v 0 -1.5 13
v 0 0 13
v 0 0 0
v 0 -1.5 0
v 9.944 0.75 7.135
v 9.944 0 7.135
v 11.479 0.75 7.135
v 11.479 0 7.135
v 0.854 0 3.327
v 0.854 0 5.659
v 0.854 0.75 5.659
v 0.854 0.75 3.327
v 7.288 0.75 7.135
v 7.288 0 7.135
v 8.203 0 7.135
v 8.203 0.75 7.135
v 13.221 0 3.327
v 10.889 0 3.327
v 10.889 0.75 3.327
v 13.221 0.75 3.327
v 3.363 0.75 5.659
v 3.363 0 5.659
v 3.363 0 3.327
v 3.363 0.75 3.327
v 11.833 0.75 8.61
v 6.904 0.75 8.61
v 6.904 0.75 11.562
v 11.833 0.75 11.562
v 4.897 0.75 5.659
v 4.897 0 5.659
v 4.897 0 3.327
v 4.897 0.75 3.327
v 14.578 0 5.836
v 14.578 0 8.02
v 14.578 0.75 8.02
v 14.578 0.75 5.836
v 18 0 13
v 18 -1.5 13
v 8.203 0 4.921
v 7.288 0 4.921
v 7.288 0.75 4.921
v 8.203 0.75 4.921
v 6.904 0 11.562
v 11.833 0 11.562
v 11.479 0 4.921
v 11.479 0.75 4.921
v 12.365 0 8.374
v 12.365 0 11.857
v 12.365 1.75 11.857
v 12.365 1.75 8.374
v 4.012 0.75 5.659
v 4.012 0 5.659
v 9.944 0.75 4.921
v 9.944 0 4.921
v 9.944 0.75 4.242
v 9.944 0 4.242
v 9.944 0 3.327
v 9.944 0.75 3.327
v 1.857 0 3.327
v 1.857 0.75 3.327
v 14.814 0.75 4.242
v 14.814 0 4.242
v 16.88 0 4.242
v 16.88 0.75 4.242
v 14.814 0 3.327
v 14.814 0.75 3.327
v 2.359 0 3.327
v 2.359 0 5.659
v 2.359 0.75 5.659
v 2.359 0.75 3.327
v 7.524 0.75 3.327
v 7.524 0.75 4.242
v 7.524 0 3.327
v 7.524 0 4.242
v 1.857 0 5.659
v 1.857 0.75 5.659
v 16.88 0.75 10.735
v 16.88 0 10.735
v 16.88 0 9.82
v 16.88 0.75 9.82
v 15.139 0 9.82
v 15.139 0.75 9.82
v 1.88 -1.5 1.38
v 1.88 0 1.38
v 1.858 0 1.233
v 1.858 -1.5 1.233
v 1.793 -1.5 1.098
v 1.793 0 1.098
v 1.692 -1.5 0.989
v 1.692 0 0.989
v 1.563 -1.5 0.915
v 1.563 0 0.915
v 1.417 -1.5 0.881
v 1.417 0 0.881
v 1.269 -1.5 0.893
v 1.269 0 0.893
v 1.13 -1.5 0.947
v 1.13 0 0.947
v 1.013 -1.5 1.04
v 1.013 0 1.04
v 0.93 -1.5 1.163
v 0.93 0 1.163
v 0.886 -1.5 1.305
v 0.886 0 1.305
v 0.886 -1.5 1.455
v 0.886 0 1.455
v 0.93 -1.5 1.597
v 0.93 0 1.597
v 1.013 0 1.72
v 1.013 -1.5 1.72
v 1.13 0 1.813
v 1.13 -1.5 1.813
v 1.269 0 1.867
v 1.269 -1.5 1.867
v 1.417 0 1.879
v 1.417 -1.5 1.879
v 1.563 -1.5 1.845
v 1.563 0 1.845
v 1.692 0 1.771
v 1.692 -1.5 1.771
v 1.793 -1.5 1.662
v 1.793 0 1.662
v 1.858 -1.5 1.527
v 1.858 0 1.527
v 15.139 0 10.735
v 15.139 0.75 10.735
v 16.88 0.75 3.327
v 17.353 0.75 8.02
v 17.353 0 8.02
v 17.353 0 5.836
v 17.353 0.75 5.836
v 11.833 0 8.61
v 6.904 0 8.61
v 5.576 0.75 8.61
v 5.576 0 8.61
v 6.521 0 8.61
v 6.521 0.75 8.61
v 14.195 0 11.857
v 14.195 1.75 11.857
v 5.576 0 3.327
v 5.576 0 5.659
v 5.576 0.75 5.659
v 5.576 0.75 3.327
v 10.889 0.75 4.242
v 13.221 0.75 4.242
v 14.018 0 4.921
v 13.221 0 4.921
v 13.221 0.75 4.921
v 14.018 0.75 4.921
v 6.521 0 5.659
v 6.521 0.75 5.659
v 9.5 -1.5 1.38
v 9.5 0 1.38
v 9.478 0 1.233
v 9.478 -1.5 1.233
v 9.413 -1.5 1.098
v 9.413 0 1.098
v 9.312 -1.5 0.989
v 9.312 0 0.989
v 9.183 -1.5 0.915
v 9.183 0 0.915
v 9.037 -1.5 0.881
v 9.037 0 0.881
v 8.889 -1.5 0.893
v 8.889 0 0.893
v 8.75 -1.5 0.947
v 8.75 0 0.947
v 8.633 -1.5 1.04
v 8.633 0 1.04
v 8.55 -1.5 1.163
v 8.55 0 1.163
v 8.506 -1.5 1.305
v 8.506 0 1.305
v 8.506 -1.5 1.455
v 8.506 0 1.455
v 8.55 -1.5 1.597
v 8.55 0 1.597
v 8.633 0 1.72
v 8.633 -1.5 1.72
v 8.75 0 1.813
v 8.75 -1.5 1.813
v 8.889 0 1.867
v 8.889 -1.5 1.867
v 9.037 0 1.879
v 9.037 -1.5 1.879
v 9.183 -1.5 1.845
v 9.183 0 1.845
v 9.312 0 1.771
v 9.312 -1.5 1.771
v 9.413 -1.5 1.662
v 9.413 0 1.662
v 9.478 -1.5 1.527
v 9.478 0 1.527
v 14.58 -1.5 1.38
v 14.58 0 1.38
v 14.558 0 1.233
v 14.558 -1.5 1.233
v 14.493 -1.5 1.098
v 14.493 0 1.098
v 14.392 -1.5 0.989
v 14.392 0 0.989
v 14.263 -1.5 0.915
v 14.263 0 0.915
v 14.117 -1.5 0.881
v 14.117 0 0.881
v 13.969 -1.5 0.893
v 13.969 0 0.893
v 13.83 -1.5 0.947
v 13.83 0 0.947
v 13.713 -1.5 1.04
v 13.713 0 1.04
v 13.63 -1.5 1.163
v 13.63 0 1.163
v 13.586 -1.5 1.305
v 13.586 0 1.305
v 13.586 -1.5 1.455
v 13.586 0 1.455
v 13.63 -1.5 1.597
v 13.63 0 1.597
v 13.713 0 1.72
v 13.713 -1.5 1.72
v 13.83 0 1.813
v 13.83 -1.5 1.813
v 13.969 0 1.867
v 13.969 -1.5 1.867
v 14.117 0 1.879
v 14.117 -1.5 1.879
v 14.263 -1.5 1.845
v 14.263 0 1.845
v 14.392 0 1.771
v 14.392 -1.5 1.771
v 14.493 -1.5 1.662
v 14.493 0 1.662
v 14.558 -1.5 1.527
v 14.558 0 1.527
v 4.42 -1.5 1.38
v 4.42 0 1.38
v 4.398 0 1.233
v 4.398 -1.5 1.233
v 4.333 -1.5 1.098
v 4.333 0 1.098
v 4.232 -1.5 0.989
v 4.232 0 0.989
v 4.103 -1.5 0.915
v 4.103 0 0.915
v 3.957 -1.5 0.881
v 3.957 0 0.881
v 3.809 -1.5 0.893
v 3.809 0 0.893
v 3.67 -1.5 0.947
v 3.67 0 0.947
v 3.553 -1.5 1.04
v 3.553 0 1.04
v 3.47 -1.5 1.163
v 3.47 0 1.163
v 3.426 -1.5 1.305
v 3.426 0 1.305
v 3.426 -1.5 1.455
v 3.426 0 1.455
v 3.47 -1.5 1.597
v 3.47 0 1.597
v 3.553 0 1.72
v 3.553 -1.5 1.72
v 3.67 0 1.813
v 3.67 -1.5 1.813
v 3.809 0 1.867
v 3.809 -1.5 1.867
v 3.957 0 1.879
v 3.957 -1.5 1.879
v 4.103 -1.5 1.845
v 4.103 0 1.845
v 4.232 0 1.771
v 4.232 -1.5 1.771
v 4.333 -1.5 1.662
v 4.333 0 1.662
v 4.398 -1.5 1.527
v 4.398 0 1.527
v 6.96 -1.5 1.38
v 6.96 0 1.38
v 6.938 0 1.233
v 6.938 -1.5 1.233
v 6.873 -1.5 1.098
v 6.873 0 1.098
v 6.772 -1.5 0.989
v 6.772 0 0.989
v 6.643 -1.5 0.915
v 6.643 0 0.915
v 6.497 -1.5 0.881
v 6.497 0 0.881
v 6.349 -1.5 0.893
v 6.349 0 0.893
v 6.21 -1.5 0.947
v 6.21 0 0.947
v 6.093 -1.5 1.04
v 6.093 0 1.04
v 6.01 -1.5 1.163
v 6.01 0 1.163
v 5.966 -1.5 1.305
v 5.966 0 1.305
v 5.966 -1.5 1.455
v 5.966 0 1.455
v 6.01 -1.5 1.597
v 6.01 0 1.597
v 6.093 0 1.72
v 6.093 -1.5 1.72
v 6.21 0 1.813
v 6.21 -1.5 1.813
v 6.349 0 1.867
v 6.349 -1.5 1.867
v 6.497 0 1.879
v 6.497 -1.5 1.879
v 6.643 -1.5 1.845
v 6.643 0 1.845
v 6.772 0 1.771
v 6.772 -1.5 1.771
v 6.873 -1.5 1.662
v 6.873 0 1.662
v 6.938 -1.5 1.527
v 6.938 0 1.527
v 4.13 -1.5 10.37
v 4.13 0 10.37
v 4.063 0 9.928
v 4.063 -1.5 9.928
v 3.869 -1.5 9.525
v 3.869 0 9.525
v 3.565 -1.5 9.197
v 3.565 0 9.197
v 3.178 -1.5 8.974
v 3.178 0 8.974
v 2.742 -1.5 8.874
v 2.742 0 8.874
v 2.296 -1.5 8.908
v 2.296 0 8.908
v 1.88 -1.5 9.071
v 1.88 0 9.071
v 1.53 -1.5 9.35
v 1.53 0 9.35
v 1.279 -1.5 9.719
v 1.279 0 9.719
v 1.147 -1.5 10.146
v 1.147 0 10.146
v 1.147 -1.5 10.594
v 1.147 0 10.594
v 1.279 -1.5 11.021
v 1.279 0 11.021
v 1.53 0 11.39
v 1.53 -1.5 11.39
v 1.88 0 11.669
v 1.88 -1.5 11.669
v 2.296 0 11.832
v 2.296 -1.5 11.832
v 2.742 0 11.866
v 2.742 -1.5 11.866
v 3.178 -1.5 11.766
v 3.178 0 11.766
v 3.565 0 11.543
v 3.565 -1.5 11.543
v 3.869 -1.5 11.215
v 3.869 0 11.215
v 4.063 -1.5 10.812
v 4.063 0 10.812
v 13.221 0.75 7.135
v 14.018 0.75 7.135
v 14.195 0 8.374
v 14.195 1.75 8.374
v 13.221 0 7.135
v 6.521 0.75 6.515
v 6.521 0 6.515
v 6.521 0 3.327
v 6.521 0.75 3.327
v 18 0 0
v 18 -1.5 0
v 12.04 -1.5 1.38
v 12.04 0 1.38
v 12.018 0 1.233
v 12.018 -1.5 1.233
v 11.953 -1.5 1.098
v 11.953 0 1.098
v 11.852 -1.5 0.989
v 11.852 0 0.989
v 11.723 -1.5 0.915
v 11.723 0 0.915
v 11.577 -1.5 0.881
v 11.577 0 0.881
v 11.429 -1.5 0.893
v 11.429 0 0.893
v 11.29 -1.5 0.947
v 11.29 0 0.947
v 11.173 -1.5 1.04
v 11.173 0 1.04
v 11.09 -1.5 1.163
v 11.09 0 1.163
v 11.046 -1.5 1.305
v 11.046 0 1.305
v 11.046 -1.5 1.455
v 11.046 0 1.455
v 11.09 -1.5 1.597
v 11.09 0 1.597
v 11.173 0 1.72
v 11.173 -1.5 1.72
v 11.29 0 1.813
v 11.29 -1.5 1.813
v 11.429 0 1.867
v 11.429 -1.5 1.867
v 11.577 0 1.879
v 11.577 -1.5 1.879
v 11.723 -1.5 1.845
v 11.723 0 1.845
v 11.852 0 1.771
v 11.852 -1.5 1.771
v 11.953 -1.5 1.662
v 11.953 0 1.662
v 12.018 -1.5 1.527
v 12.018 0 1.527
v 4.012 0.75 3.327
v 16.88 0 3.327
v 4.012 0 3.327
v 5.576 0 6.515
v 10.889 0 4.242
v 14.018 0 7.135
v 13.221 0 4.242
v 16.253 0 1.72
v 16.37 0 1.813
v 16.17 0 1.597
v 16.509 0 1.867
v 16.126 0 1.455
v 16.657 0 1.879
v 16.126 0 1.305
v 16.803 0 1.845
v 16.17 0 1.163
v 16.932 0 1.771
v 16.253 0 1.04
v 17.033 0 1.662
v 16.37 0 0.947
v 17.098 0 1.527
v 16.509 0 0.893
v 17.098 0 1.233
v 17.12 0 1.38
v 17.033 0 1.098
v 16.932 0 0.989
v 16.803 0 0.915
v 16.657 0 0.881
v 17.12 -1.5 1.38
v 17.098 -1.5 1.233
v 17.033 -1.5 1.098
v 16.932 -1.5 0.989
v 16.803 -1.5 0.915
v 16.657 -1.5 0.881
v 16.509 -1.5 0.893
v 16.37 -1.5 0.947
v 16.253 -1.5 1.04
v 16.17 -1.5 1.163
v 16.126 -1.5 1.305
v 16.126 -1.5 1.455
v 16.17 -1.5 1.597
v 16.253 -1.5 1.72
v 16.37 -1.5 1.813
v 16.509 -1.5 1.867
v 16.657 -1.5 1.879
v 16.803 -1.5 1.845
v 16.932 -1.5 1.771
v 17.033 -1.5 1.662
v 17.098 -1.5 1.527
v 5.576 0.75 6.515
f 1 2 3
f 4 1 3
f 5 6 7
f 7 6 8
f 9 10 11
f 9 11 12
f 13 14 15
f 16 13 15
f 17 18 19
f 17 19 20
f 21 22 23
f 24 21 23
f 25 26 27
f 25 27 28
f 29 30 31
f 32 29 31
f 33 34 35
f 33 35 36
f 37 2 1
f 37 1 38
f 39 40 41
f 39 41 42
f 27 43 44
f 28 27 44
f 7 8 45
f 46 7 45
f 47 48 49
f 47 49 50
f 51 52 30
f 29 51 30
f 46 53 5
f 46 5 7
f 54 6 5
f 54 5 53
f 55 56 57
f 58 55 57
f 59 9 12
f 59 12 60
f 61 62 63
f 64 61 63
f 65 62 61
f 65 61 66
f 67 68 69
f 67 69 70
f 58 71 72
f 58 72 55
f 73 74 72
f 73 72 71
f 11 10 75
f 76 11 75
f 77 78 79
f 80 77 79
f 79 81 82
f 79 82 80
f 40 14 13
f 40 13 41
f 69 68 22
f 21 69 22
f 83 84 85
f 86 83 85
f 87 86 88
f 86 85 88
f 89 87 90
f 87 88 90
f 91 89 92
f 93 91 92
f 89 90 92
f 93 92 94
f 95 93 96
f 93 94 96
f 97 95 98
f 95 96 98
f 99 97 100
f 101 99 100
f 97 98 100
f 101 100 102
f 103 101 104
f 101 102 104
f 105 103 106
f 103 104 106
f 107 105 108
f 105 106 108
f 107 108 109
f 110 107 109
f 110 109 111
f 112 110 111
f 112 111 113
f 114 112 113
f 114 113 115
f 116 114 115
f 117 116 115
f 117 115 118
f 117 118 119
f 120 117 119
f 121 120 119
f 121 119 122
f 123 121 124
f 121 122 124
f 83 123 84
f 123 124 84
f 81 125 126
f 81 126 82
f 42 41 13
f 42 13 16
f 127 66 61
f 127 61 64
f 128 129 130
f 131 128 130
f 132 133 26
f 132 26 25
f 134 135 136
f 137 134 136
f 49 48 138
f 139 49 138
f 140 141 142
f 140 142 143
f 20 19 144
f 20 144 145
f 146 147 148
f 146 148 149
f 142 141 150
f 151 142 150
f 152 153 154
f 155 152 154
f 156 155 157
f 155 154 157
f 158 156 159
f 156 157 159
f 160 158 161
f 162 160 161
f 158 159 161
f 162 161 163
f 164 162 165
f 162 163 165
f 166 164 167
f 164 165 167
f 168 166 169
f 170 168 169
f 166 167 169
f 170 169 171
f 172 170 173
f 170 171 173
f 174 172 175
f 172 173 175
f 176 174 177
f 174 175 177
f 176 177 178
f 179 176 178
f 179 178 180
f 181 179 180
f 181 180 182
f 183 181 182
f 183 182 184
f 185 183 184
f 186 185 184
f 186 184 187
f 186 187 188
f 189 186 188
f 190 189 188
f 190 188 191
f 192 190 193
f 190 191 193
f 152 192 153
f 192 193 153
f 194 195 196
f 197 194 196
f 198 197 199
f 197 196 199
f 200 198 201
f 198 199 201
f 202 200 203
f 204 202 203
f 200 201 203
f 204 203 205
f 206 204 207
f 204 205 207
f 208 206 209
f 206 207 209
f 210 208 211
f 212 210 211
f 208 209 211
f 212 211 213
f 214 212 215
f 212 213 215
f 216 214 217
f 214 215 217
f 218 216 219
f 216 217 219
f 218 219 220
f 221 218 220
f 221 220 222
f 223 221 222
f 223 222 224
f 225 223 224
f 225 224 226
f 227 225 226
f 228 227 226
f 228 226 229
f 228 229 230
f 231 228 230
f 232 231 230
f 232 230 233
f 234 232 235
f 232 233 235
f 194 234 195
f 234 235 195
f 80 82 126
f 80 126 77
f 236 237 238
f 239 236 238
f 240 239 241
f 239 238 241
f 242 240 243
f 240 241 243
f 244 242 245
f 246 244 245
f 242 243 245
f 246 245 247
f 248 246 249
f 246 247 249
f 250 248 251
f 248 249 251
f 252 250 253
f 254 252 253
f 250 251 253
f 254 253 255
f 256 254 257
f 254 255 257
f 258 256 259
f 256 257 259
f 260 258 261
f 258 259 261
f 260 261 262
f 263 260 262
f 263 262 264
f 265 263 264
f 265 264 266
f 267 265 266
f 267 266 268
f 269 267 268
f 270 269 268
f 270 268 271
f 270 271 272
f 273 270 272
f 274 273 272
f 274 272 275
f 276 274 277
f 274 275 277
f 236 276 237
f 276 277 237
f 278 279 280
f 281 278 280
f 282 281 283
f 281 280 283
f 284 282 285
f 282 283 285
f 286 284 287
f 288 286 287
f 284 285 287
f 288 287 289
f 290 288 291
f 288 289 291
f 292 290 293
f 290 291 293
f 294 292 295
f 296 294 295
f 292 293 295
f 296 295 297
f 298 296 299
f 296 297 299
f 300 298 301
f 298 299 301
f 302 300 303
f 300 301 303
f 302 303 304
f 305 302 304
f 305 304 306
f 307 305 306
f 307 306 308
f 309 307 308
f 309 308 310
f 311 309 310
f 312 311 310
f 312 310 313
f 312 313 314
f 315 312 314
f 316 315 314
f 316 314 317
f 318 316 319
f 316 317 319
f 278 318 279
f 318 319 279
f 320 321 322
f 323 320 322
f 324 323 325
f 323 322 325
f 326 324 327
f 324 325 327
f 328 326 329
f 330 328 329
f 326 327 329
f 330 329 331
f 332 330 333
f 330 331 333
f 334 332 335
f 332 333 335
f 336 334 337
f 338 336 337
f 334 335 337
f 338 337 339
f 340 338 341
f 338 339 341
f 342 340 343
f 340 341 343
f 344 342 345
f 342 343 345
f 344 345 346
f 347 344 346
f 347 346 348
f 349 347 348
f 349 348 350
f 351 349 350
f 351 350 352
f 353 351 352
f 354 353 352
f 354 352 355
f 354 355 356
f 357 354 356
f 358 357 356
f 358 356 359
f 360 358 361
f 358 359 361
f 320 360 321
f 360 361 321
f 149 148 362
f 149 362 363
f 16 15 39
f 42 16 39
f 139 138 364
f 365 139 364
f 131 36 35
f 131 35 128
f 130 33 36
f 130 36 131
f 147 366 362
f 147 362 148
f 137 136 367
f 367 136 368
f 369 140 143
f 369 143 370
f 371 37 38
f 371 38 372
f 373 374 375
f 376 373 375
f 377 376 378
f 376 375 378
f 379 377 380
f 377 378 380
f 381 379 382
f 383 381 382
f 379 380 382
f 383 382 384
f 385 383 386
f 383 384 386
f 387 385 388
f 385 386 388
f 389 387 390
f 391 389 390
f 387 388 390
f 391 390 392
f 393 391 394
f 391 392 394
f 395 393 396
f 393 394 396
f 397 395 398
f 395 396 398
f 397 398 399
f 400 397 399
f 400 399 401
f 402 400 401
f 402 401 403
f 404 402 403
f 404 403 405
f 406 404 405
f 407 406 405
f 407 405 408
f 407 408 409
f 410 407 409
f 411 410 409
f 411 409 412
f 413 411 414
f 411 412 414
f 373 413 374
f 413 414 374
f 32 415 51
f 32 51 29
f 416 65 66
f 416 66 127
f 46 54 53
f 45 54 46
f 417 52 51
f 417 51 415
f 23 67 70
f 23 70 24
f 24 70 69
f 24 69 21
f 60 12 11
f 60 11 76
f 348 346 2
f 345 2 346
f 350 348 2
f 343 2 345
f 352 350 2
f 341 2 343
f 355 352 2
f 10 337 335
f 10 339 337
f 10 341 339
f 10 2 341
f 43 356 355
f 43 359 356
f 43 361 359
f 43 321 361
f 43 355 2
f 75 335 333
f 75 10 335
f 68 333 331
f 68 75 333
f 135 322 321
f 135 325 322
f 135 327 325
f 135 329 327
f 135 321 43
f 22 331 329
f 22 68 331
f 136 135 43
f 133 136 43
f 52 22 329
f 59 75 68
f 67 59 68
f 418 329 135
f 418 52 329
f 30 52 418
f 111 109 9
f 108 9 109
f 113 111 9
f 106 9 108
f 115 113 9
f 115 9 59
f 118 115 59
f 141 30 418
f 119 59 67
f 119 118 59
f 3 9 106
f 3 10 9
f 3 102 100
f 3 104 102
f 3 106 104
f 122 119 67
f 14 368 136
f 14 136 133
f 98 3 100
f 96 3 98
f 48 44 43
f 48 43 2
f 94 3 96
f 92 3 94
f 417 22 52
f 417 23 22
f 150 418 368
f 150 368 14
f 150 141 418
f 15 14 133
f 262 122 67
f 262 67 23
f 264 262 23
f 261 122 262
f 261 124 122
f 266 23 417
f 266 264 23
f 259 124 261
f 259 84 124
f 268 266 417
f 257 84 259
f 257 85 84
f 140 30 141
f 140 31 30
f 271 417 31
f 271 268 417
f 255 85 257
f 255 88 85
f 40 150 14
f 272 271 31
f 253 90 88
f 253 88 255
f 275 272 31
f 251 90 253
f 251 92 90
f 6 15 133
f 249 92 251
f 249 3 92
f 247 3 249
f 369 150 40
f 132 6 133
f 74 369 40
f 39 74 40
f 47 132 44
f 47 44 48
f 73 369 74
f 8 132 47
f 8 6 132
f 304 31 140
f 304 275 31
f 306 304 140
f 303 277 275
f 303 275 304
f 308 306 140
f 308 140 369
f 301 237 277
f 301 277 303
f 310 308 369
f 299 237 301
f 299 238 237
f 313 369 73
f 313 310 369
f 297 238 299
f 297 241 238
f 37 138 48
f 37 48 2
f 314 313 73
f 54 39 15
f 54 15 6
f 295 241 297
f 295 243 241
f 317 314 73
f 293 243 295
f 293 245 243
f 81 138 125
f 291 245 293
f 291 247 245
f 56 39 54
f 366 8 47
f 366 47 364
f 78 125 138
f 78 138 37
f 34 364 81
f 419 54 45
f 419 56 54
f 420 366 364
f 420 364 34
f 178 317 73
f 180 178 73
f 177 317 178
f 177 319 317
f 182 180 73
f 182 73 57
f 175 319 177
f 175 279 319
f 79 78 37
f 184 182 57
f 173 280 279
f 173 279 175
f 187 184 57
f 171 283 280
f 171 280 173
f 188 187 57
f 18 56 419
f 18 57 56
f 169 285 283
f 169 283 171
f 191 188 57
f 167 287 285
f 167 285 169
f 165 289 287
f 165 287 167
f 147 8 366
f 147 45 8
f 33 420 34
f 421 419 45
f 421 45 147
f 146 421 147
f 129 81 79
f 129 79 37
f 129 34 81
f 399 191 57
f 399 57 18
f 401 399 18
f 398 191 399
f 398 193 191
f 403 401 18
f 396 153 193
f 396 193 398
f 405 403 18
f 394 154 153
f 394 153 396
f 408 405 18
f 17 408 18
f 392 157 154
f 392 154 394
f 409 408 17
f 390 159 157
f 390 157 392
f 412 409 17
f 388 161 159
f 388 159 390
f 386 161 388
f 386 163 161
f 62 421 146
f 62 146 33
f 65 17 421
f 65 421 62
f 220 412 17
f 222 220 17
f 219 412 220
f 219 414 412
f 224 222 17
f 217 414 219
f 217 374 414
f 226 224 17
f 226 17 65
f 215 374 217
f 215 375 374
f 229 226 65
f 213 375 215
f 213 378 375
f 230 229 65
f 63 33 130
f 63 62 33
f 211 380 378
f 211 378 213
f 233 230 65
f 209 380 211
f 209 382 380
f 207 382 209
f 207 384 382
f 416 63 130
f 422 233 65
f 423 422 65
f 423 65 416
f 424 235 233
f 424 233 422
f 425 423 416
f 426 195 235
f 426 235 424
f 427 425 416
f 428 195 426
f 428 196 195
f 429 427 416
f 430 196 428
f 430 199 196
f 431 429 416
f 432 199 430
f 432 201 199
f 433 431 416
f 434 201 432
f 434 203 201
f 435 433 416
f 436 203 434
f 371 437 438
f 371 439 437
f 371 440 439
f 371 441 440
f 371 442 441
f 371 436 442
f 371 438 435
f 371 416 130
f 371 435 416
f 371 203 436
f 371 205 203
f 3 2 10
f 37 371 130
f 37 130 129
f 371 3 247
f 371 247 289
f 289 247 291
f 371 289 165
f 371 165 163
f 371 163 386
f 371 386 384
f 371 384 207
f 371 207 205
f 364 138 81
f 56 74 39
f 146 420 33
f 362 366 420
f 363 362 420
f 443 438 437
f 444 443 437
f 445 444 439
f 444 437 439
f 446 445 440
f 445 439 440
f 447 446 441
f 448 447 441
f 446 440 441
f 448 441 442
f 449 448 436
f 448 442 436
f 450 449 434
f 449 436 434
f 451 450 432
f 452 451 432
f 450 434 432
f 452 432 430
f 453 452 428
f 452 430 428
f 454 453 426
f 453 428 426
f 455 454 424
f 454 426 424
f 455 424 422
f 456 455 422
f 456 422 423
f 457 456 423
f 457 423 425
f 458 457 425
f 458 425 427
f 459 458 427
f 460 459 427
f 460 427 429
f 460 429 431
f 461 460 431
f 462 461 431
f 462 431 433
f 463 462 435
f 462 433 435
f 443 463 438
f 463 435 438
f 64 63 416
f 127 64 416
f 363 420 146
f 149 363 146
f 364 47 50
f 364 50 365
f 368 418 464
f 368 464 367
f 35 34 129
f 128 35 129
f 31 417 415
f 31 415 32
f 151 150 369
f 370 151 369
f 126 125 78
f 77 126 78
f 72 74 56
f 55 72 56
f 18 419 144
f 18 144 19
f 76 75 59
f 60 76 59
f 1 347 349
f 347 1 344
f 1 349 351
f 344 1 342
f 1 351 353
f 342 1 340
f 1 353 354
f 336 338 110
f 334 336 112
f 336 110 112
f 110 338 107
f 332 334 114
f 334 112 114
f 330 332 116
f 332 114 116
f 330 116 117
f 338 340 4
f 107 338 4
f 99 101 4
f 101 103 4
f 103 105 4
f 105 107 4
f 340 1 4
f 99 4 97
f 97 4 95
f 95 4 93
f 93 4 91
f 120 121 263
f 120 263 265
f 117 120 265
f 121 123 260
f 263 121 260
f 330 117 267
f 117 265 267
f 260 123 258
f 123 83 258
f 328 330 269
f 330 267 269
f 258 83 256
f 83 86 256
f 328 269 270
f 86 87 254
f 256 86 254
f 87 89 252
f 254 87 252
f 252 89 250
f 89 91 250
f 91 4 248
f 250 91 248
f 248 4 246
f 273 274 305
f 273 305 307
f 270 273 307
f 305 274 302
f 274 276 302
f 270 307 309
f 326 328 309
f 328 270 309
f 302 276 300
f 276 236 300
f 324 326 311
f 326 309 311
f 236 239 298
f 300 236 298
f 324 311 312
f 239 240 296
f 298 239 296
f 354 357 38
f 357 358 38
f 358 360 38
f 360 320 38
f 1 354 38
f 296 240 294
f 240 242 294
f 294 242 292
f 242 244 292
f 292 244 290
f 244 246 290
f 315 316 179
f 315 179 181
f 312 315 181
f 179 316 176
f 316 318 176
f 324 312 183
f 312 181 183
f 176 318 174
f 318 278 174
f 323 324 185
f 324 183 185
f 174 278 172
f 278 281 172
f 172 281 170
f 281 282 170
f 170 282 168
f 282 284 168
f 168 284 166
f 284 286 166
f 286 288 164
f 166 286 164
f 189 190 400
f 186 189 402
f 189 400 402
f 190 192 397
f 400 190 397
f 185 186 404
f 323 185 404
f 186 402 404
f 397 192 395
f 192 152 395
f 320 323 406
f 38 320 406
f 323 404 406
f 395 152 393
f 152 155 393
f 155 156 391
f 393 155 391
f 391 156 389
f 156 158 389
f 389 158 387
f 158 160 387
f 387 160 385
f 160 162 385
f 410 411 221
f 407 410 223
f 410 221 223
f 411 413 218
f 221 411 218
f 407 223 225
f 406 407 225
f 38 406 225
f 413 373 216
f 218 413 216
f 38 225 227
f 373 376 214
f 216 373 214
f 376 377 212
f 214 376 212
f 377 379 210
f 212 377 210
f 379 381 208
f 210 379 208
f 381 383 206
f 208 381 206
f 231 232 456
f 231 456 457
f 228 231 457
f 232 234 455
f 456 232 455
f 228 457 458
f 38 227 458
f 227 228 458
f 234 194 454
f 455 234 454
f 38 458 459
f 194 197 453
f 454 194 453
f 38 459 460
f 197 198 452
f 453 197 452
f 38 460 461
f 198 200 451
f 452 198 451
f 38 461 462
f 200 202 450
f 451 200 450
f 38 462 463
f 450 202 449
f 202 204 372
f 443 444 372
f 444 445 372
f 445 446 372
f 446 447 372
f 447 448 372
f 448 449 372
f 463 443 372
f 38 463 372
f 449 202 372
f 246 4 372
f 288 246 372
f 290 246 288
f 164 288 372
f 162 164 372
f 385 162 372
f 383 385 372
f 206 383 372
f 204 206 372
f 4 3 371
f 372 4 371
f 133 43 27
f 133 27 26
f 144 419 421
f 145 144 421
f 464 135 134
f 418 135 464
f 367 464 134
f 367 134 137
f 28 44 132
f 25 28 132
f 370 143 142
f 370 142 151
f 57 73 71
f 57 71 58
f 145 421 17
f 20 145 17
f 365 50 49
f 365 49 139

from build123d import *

# Parameters (mm, degrees)
SKETCH1_W           = 18
SKETCH1_H           = 13
SKETCH1_R           = 0.5
SKETCH1_R_2         = 1.5
BOSS_EXTRUDE1_DEPTH = 1.5
SKETCH2_W           = 1.829914293
SKETCH2_H           = 3.482740107
BOSS_EXTRUDE2_DEPTH = 1.75
SKETCH3_W           = 4.928962693
SKETCH3_H           = 2.951474666
SKETCH3_W_2         = 1.003501387
SKETCH3_H_2         = 2.331664987
SKETCH3_W_3         = 0.8854424
SKETCH3_W_4         = 0.944471893
SKETCH3_H_3         = 2.095547014
SKETCH3_W_5         = 0.914957147
SKETCH3_H_4         = 2.213606
SKETCH3_W_6         = 2.420209226
SKETCH3_H_5         = 0.914957147
SKETCH3_W_7         = 2.331664986
SKETCH3_W_8         = 2.066032267
SKETCH3_W_9         = 0.79689816
SKETCH3_W_10        = 2.774386186
SKETCH3_H_6         = 2.184091253
SKETCH3_W_11        = 1.741370054
SKETCH3_W_12        = 1.534766827
BOSS_EXTRUDE3_DEPTH = 0.75


with BuildPart() as part:
    # Sketch1 → Boss-Extrude1 (new body)
    with BuildSketch(Plane(origin=(0, 0, 0), x_dir=(1, 0, 0), z_dir=(0, 1, 0))):
        with Locations((9, -6.5)):
            Rectangle(SKETCH1_W, SKETCH1_H)
        with Locations((1.38, -1.38)):
            Circle(SKETCH1_R, mode=Mode.SUBTRACT)
        with Locations((3.92, -1.38)):
            Circle(SKETCH1_R, mode=Mode.SUBTRACT)
        with Locations((6.46, -1.38)):
            Circle(SKETCH1_R, mode=Mode.SUBTRACT)
        with Locations((9, -1.38)):
            Circle(SKETCH1_R, mode=Mode.SUBTRACT)
        with Locations((11.54, -1.38)):
            Circle(SKETCH1_R, mode=Mode.SUBTRACT)
        with Locations((14.08, -1.38)):
            Circle(SKETCH1_R, mode=Mode.SUBTRACT)
        with Locations((16.62, -1.38)):
            Circle(SKETCH1_R, mode=Mode.SUBTRACT)
        with Locations((2.63, -10.37)):
            Circle(SKETCH1_R_2, mode=Mode.SUBTRACT)
    extrude(amount=-BOSS_EXTRUDE1_DEPTH)

    # Sketch2 → Boss-Extrude2 (add)
    with BuildSketch(Plane(origin=(0, 0, 0), x_dir=(1, 0, 0), z_dir=(0, 1, 0))):
        with Locations((13.279638267, -10.115556466)):
            Rectangle(SKETCH2_W, SKETCH2_H)
    extrude(amount=BOSS_EXTRUDE2_DEPTH)

    # Sketch3 → Boss-Extrude3 (add)
    with BuildSketch(Plane(origin=(0, 0, 0), x_dir=(1, 0, 0), z_dir=(0, 1, 0))):
        with Locations((9.368934334, -10.08604172)):
            Rectangle(SKETCH3_W, SKETCH3_H)
        with Locations((1.355680614, -4.492997226)):
            Rectangle(SKETCH3_W_2, SKETCH3_H_2)
        with Locations((2.860932694, -4.492997226)):
            Rectangle(SKETCH3_W_2, SKETCH3_H_2)
        with Locations((4.454729013, -4.492997226)):
            Rectangle(SKETCH3_W_3, SKETCH3_H_2)
        with Locations((6.048525334, -4.492997226)):
            Rectangle(SKETCH3_W_4, SKETCH3_H_2)
        with Locations((6.048525334, -7.56253088)):
            Rectangle(SKETCH3_W_4, SKETCH3_H_3)
        with Locations((7.745623267, -6.027764053)):
            Rectangle(SKETCH3_W_5, SKETCH3_H_4)
        with Locations((8.73436728, -3.784643307)):
            Rectangle(SKETCH3_W_6, SKETCH3_H_5)
        with Locations((12.05477628, -3.784643307)):
            Rectangle(SKETCH3_W_7, SKETCH3_H_5)
        with Locations((15.847421227, -3.784643307)):
            Rectangle(SKETCH3_W_8, SKETCH3_H_5)
        with Locations((13.619057853, -6.027764053)):
            Rectangle(SKETCH3_W_9, SKETCH3_H_4)
        with Locations((15.965480213, -6.927963827)):
            Rectangle(SKETCH3_W_10, SKETCH3_H_6)
        with Locations((16.009752333, -10.277887574)):
            Rectangle(SKETCH3_W_11, SKETCH3_H_5)
        with Locations((10.711855307, -6.027764053)):
            Rectangle(SKETCH3_W_12, SKETCH3_H_4)
    extrude(amount=BOSS_EXTRUDE3_DEPTH)


solid = part.part
